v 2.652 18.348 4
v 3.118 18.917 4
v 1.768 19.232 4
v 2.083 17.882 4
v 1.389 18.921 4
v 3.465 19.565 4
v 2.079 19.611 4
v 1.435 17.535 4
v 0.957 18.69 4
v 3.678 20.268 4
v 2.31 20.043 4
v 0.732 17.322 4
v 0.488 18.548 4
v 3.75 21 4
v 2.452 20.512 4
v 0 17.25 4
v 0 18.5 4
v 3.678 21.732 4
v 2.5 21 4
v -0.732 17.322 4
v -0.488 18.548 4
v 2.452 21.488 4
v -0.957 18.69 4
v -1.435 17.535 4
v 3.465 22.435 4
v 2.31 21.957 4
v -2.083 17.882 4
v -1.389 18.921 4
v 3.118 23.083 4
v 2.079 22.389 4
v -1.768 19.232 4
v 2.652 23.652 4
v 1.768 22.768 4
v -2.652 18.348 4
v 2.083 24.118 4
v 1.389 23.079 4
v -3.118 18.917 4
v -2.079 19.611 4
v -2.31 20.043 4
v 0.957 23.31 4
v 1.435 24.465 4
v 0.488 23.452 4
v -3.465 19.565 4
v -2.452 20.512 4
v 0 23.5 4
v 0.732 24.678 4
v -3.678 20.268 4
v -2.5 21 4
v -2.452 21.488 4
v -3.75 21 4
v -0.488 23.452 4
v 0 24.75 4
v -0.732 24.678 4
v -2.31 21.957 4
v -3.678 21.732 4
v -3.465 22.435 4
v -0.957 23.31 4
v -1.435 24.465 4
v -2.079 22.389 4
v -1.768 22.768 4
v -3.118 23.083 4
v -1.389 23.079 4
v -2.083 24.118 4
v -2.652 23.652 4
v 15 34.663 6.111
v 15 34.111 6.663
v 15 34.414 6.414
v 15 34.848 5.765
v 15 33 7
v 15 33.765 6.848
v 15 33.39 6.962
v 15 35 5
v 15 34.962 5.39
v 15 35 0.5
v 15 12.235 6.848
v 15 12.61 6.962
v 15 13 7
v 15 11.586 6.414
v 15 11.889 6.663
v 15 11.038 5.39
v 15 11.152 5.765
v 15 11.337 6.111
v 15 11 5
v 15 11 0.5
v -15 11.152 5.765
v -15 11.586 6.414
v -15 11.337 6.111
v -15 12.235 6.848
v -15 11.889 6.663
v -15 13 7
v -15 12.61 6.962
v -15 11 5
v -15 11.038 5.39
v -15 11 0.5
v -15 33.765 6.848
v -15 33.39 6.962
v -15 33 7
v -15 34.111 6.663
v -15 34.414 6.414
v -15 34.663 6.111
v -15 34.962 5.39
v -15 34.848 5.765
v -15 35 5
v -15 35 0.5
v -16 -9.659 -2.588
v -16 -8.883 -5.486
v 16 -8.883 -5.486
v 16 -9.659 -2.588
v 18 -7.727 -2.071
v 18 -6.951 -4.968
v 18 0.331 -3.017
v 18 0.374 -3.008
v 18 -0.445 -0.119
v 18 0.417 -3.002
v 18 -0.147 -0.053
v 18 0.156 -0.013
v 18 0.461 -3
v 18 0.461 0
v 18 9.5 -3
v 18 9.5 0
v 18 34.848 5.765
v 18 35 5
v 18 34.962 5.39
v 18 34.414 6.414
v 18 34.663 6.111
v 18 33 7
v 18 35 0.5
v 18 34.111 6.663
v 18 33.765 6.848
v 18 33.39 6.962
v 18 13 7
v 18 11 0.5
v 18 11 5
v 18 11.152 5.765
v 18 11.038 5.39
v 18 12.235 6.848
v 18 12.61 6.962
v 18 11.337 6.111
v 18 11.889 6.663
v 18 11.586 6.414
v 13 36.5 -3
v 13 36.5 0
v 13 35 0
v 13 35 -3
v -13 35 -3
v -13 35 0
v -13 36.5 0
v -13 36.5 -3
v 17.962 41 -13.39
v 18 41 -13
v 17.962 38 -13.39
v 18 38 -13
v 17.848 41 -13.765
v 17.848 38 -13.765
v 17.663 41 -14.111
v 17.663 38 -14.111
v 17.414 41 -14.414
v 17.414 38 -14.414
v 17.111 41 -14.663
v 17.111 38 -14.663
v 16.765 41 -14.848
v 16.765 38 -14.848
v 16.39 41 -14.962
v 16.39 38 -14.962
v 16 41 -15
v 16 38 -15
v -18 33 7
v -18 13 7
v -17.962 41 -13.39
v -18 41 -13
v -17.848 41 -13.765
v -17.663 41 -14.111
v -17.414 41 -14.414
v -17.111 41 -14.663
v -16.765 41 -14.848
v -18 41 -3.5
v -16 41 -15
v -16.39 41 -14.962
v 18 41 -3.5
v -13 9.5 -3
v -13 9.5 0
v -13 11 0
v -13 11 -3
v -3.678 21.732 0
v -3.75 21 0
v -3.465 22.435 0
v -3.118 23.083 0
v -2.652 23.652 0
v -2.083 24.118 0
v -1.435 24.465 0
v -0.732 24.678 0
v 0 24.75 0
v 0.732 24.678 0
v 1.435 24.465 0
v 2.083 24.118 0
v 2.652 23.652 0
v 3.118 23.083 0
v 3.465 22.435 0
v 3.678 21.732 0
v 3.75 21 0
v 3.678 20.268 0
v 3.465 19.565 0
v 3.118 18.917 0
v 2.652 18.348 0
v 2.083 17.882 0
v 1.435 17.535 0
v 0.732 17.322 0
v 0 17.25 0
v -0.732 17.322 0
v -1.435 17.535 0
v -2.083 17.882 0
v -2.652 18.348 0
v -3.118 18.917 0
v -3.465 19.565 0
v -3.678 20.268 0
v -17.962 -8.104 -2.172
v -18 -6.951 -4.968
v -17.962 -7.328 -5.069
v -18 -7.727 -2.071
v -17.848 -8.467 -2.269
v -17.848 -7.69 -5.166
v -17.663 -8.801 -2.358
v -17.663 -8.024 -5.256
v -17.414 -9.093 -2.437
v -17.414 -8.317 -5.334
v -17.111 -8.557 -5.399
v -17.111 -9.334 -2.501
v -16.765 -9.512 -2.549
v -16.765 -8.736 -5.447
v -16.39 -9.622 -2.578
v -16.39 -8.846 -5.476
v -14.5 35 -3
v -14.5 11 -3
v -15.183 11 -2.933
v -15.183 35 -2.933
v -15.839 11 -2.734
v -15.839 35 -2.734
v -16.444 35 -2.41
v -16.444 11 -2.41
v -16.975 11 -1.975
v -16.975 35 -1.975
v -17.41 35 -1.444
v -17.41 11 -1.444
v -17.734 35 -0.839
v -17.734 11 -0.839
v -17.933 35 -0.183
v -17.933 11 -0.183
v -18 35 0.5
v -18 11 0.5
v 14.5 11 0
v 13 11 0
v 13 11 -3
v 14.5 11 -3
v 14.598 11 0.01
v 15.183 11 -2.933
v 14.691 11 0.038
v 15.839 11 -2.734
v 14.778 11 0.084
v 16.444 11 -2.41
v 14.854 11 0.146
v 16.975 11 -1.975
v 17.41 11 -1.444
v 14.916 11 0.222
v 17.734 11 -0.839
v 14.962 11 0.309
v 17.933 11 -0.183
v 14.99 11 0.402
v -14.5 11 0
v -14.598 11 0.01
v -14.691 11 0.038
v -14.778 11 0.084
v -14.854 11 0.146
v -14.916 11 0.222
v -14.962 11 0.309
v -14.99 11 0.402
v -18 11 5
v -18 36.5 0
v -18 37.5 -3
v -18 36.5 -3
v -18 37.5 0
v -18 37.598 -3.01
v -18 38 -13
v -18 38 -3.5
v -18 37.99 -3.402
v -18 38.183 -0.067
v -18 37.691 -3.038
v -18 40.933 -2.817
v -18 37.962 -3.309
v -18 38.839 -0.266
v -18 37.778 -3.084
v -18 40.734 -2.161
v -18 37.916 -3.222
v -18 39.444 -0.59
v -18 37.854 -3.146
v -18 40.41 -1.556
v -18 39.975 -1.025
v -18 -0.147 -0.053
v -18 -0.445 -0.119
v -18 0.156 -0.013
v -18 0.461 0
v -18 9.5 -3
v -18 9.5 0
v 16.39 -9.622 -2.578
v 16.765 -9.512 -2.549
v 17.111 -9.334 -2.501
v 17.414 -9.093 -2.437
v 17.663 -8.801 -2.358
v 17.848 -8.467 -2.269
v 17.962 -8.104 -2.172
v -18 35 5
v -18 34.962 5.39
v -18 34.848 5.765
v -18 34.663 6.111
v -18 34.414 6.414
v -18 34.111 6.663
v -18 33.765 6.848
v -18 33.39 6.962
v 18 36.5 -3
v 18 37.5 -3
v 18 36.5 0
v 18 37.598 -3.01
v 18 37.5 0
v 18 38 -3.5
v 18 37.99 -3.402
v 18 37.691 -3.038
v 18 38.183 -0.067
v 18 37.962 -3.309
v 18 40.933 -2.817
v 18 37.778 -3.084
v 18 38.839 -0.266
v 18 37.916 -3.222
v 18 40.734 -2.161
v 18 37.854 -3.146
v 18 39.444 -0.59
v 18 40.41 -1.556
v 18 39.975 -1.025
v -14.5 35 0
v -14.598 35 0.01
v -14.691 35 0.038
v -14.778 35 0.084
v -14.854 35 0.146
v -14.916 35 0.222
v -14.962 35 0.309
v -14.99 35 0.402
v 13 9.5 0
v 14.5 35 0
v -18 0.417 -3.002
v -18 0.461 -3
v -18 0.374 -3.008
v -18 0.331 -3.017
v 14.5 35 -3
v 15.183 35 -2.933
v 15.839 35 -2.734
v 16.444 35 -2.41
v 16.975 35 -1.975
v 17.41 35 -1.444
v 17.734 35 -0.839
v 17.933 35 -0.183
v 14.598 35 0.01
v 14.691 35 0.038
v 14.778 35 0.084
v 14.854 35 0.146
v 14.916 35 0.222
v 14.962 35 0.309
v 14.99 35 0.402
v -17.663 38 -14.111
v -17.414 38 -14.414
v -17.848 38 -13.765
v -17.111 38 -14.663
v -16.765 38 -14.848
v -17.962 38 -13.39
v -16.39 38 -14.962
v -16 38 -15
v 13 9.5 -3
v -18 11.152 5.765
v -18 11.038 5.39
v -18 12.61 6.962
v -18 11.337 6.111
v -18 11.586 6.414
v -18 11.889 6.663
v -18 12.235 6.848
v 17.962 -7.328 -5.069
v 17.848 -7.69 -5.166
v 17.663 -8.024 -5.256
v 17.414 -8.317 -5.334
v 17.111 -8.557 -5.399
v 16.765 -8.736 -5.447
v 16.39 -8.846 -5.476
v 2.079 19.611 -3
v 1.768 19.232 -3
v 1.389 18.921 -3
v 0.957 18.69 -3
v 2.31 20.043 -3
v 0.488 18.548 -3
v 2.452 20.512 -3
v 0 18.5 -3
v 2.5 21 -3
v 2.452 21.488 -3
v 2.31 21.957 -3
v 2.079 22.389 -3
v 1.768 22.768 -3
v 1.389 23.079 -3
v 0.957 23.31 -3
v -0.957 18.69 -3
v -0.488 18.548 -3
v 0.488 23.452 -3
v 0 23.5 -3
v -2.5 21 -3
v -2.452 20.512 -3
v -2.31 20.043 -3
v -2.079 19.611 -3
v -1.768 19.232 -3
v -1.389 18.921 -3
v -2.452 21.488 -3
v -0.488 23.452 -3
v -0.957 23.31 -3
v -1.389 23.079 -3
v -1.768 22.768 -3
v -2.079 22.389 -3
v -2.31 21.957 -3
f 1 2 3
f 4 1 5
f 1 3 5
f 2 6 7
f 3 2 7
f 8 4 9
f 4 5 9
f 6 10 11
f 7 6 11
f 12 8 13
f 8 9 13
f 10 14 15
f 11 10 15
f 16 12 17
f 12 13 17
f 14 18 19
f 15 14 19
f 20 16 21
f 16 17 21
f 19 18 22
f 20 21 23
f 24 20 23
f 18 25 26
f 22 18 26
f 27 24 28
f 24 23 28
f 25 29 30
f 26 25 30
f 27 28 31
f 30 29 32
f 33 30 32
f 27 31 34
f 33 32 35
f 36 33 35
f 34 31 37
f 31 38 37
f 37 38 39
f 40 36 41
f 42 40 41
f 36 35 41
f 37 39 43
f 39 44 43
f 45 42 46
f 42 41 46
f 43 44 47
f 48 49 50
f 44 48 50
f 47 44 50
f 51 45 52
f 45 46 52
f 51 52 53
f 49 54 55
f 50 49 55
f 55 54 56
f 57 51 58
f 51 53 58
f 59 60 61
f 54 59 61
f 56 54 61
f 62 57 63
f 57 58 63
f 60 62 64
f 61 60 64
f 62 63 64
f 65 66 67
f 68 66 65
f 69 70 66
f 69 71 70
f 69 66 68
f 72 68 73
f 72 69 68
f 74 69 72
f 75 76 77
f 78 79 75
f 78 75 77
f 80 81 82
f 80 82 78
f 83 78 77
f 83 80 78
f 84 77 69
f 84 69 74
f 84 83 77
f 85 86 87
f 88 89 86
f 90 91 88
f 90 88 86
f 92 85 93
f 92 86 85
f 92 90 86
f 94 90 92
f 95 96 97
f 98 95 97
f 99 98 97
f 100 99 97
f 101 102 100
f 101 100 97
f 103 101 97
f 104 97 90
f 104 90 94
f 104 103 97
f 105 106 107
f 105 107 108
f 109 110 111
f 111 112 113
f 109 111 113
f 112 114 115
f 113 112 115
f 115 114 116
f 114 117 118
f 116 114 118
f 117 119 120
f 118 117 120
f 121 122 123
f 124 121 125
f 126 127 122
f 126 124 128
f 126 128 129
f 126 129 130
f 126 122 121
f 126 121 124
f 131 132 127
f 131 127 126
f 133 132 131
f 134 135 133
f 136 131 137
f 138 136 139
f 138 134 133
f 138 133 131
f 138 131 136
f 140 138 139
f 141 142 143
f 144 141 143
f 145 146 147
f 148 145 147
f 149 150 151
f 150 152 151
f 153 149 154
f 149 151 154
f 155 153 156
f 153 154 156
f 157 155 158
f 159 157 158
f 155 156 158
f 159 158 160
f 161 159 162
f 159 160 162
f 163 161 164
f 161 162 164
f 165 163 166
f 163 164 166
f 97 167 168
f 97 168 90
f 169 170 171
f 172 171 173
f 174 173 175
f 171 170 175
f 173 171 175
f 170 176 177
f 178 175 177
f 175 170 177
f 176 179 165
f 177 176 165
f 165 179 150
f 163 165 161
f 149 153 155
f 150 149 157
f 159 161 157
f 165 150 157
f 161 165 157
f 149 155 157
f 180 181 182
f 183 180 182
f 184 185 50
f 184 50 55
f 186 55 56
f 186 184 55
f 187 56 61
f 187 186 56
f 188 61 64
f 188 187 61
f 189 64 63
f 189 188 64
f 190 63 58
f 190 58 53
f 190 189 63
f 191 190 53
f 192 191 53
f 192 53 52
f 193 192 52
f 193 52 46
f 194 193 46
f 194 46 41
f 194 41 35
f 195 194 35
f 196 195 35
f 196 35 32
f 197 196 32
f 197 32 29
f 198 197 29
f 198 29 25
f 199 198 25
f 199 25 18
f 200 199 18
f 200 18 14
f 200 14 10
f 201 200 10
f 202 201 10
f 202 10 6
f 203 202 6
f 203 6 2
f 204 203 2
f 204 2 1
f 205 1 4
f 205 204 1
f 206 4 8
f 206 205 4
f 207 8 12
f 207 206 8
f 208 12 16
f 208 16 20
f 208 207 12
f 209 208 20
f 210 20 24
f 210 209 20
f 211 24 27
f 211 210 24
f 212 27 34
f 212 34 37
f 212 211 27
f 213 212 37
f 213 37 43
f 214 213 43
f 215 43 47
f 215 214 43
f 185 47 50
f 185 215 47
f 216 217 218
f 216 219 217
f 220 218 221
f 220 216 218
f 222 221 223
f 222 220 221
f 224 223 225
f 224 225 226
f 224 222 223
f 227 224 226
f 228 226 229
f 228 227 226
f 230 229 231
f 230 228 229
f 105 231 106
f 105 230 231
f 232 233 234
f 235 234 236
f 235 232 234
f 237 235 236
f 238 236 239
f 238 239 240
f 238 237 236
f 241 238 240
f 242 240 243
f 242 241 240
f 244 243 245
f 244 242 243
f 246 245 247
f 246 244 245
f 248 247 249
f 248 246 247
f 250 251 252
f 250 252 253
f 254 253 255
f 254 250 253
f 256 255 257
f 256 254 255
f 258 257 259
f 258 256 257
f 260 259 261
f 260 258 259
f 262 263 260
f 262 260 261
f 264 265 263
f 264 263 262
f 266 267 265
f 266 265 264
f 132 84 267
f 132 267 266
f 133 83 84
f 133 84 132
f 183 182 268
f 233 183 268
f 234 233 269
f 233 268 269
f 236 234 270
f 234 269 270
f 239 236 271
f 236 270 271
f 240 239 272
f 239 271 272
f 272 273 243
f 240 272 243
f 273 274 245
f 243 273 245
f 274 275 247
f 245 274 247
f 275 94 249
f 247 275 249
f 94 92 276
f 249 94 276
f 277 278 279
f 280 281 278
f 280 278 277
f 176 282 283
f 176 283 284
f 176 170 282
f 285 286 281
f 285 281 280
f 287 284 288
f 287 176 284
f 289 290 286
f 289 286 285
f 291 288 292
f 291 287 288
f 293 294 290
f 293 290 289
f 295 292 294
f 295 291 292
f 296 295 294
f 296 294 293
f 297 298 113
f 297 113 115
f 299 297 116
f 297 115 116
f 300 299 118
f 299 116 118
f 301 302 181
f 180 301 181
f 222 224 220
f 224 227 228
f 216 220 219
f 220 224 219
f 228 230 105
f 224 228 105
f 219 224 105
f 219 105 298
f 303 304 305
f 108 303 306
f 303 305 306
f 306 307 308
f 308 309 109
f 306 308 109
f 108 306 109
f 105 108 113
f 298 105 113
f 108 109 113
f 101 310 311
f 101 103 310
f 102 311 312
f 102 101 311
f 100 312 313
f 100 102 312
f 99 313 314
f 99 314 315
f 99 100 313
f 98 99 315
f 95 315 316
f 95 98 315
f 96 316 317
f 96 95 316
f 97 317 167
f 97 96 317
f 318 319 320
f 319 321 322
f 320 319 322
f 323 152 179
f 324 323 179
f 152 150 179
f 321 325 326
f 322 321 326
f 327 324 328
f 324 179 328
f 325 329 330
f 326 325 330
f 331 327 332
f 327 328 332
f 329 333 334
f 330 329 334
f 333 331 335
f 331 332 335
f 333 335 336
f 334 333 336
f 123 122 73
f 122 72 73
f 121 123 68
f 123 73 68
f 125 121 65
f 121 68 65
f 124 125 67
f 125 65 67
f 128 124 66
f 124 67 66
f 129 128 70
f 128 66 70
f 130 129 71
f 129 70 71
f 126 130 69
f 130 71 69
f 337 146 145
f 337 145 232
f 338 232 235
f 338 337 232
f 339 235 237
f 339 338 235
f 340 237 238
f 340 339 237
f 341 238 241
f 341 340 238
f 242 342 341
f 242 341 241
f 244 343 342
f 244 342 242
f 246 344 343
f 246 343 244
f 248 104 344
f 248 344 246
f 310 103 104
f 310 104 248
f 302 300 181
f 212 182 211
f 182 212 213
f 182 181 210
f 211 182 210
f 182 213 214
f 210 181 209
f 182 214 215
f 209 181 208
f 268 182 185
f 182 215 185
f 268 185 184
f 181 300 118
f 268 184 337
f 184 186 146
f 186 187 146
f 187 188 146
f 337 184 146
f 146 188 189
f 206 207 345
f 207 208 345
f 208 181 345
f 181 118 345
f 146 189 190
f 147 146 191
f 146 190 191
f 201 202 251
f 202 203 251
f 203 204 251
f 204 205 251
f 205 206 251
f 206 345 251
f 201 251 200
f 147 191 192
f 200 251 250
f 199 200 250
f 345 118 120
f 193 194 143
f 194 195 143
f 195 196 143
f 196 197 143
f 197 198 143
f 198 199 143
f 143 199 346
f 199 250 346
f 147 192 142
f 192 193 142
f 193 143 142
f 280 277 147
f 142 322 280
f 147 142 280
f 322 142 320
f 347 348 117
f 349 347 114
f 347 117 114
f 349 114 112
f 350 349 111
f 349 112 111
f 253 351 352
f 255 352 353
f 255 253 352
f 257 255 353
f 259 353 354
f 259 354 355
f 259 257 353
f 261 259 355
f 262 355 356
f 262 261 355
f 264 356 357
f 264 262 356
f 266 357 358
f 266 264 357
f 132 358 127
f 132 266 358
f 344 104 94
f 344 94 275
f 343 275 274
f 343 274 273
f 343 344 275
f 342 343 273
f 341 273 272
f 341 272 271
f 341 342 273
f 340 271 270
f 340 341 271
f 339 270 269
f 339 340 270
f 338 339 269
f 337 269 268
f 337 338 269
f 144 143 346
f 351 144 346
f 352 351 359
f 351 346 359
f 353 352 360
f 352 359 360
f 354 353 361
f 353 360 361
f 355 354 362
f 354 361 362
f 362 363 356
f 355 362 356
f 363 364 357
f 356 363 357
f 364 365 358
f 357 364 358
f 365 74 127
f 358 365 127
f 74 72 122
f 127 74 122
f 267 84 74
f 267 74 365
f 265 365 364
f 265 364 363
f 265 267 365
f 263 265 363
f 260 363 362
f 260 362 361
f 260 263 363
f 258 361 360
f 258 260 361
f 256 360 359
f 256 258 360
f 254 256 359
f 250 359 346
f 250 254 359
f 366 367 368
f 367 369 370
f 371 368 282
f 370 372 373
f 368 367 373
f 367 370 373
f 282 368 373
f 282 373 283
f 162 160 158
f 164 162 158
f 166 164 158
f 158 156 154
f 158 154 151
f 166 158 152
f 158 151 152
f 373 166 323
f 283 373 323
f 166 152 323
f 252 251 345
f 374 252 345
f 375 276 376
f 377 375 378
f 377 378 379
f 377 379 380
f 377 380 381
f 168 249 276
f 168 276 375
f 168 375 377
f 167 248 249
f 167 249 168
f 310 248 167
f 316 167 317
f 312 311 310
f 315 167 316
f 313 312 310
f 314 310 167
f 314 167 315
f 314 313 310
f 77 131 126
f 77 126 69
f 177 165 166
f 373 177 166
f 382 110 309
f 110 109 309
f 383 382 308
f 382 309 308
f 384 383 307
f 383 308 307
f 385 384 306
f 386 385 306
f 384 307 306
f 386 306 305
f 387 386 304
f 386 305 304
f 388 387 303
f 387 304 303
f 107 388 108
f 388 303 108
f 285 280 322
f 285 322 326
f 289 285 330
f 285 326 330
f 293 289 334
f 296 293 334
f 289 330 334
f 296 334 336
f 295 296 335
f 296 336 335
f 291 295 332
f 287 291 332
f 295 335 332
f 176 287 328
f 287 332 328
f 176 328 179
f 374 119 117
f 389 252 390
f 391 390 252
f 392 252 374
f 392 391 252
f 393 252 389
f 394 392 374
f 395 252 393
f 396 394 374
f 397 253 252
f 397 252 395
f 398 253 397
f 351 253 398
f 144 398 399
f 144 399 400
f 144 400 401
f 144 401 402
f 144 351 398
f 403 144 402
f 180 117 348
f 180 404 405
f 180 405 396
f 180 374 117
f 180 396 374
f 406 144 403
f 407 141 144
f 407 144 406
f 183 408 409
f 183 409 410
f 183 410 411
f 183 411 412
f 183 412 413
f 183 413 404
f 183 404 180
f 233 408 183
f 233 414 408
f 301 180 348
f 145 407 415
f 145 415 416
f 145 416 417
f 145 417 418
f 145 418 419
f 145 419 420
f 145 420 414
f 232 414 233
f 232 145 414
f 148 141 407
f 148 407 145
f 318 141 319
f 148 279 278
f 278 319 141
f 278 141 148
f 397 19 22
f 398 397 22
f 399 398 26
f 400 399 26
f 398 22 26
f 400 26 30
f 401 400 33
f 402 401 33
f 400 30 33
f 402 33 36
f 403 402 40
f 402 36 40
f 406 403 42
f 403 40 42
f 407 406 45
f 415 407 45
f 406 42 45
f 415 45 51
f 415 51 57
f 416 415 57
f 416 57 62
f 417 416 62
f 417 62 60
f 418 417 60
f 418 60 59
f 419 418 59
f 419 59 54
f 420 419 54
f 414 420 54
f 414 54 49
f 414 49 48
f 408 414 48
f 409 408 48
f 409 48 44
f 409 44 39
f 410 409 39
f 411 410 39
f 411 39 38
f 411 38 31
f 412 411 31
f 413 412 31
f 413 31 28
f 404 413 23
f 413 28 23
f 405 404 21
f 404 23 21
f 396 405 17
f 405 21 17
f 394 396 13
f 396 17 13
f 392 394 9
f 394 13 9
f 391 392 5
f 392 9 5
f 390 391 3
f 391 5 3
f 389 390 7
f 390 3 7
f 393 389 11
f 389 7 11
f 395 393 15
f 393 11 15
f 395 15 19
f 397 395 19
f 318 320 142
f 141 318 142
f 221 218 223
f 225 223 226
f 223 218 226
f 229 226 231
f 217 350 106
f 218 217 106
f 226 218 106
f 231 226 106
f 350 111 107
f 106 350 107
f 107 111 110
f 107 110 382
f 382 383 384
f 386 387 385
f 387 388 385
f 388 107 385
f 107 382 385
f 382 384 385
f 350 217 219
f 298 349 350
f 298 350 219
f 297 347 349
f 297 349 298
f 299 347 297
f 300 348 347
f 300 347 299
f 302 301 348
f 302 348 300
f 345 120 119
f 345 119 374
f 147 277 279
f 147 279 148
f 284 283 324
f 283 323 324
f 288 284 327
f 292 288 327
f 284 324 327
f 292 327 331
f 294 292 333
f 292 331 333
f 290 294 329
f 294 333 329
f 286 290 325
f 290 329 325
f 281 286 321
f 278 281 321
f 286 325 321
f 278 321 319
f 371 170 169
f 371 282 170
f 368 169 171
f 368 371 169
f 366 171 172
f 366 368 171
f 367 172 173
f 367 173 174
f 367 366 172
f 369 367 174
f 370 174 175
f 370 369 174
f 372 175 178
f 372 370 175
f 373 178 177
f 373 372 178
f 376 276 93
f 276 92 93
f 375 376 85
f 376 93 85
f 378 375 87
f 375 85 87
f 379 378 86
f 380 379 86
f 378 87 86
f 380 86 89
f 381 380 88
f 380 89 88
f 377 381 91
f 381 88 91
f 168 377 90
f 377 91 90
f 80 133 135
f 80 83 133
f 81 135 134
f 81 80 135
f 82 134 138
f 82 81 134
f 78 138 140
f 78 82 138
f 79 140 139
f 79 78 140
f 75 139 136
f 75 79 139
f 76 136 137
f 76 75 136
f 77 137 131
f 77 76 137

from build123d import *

# Parameters (mm, degrees)
SM_BASE_FLANGE_1_DEPTH            = 18
SM_EDGE_FLANGE_1_STRIP_W          = 13
SM_EDGE_FLANGE_1_STRIP_H          = 3
SM_EDGE_FLANGE_1_STRIP_CUT_DEPTH  = 24
SM_EDGE_FLANGE_1_RELIEF_W         = 14.5
SM_EDGE_FLANGE_1_RELIEF_H         = 1.5
SM_EDGE_FLANGE_1_RELIEF_CUT_DEPTH = 3
SM_EDGE_FLANGE_1_DEPTH            = 24
SM_EDGE_FLANGE_2_STRIP_W          = 13
SM_EDGE_FLANGE_2_STRIP_H          = 3
SM_EDGE_FLANGE_2_STRIP_CUT_DEPTH  = 24
SM_EDGE_FLANGE_2_RELIEF_W         = 14.5
SM_EDGE_FLANGE_2_RELIEF_H         = 1.5
SM_EDGE_FLANGE_2_RELIEF_CUT_DEPTH = 3
SM_EDGE_FLANGE_2_DEPTH            = 24
SKETCH_12_R                       = 3.75
EXTRUDE_1_DEPTH                   = 7
HOLE_WIZARD_M6_1_D                = 5
HOLE_WIZARD_M6_1_DEPTH            = 15
HOLE_WIZARD_M6_1_TIP              = 1.502151548
FILLET_1_R                        = 2


# Sheet-metal steps are written as plain solids
with BuildPart() as part:
    # 草图2 → 基体-法兰1 (new, symmetric)
    with BuildSketch(Plane(origin=(0, 0, 0), x_dir=(0, 0, -1), z_dir=(1, 0, 0))):
        with BuildLine():
            Line((2.588190451, -9.659258263), (0.119259608, -0.445082916))
            ThreePointArc((0.119259608, -0.445082916), (0.029942985, 0.003942069), (0, 0.460783742))
            Line((0, 0.460783742), (0, 37.5))
            ThreePointArc((0, 37.5), (1.025126266, 39.974873734), (3.5, 41))
            Line((3.5, 41), (15, 41))
            Line((15, 41), (15, 38))
            Line((15, 38), (3.5, 38))
            ThreePointArc((3.5, 38), (3.146446609, 37.853553391), (3, 37.5))
            Line((3, 37.5), (3, 0.460783742))
            ThreePointArc((3, 0.460783742), (3.004277569, 0.395520645), (3.017037087, 0.331374219))
            Line((3.017037087, 0.331374219), (5.48596793, -8.882801128))
            Line((5.48596793, -8.882801128), (2.588190451, -9.659258263))
        make_face()
    extrude(amount=SM_BASE_FLANGE_1_DEPTH, both=True)

    # 边线-法兰1 strip (across the edge) → 边线-法兰1 strip cut (cut)
    with BuildSketch(Plane(origin=(18, 11, 0), x_dir=(-1, 0, 0), z_dir=(0, 1, 0))):
        with Locations((-3, -1.5)):
            Rectangle(SM_EDGE_FLANGE_1_STRIP_W, SM_EDGE_FLANGE_1_STRIP_H)
    extrude(amount=SM_EDGE_FLANGE_1_STRIP_CUT_DEPTH, mode=Mode.SUBTRACT)

    # 边线-法兰1 relief (on the sheet) → 边线-法兰1 relief cut (cut)
    with BuildSketch(Plane(origin=(14.5, 11, 0), x_dir=(-1, 0, 0), z_dir=(0, 0, 1))):
        with Locations((-5.75, 0.75)):
            Rectangle(SM_EDGE_FLANGE_1_RELIEF_W, SM_EDGE_FLANGE_1_RELIEF_H)
        with Locations((-5.75, -24.75)):
            Rectangle(SM_EDGE_FLANGE_1_RELIEF_W, SM_EDGE_FLANGE_1_RELIEF_H)
    extrude(amount=-SM_EDGE_FLANGE_1_RELIEF_CUT_DEPTH, mode=Mode.SUBTRACT)

    # 边线-法兰1 section (across the edge) → 边线-法兰1 (add)
    with BuildSketch(Plane(origin=(18, 11, 0), x_dir=(-1, 0, 0), z_dir=(0, 1, 0))):
        with BuildLine():
            Line((0, 0.5), (0, 7))
            Line((0, 7), (3, 7))
            Line((3, 7), (3, 0.5))
            ThreePointArc((3, 0.5), (3.146446609, 0.146446609), (3.5, 0))
            Line((3.5, 0), (3.5, -3))
            ThreePointArc((3.5, -3), (1.025126266, -1.974873734), (0, 0.5))
        make_face()
    extrude(amount=SM_EDGE_FLANGE_1_DEPTH)

    # 边线-法兰2 strip (across the edge) → 边线-法兰2 strip cut (cut)
    with BuildSketch(Plane(origin=(-18, 35, 0), x_dir=(1, 0, 0), z_dir=(0, -1, 0))):
        with Locations((-3, -1.5)):
            Rectangle(SM_EDGE_FLANGE_2_STRIP_W, SM_EDGE_FLANGE_2_STRIP_H)
    extrude(amount=SM_EDGE_FLANGE_2_STRIP_CUT_DEPTH, mode=Mode.SUBTRACT)

    # 边线-法兰2 relief (on the sheet) → 边线-法兰2 relief cut (cut)
    with BuildSketch(Plane(origin=(-14.5, 35, 0), x_dir=(1, 0, 0), z_dir=(0, 0, 1))):
        with Locations((-5.75, 0.75)):
            Rectangle(SM_EDGE_FLANGE_2_RELIEF_W, SM_EDGE_FLANGE_2_RELIEF_H)
        with Locations((-5.75, -24.75)):
            Rectangle(SM_EDGE_FLANGE_2_RELIEF_W, SM_EDGE_FLANGE_2_RELIEF_H)
    extrude(amount=-SM_EDGE_FLANGE_2_RELIEF_CUT_DEPTH, mode=Mode.SUBTRACT)

    # 边线-法兰2 section (across the edge) → 边线-法兰2 (add)
    with BuildSketch(Plane(origin=(-18, 35, 0), x_dir=(1, 0, 0), z_dir=(0, -1, 0))):
        with BuildLine():
            Line((0, 0.5), (0, 7))
            Line((0, 7), (3, 7))
            Line((3, 7), (3, 0.5))
            ThreePointArc((3, 0.5), (3.146446609, 0.146446609), (3.5, 0))
            Line((3.5, 0), (3.5, -3))
            ThreePointArc((3.5, -3), (1.025126266, -1.974873734), (0, 0.5))
        make_face()
    extrude(amount=SM_EDGE_FLANGE_2_DEPTH)

    # 草图12 → 凸台-拉伸1 (add)
    with BuildSketch(Plane(origin=(0, 0, -3), x_dir=(-1, 0, 0), z_dir=(0, 0, -1))):
        with Locations((0, 21)):
            Circle(SKETCH_12_R)
    extrude(amount=-EXTRUDE_1_DEPTH)

    # M6 螺纹孔1
    with Locations(Plane(origin=(0, 0, -3), x_dir=(-1, 0, 0), z_dir=(0, 0, -1))):
        with Locations((0, 21)):
            Hole(HOLE_WIZARD_M6_1_D / 2, depth=HOLE_WIZARD_M6_1_DEPTH)
            with Locations((0, 0, -(HOLE_WIZARD_M6_1_DEPTH + HOLE_WIZARD_M6_1_TIP / 2))):  # 118° drill point
                Cone(0, HOLE_WIZARD_M6_1_D / 2, HOLE_WIZARD_M6_1_TIP, mode=Mode.SUBTRACT)

    # 圆角1
    fillet_1_edges = [part.edges().sort_by_distance(p)[0] for p in [
        (-18, -9.271029695, -4.03707919),
        (-16.5, 35, 7),
        (-16.5, 11, 7),
        (-18, 39.5, -15),
        (18, -9.271029695, -4.03707919),
        (18, 39.5, -15),
        (16.5, 11, 7),
        (16.5, 35, 7),
    ]]
    fillet(fillet_1_edges, radius=FILLET_1_R)


solid = part.part
